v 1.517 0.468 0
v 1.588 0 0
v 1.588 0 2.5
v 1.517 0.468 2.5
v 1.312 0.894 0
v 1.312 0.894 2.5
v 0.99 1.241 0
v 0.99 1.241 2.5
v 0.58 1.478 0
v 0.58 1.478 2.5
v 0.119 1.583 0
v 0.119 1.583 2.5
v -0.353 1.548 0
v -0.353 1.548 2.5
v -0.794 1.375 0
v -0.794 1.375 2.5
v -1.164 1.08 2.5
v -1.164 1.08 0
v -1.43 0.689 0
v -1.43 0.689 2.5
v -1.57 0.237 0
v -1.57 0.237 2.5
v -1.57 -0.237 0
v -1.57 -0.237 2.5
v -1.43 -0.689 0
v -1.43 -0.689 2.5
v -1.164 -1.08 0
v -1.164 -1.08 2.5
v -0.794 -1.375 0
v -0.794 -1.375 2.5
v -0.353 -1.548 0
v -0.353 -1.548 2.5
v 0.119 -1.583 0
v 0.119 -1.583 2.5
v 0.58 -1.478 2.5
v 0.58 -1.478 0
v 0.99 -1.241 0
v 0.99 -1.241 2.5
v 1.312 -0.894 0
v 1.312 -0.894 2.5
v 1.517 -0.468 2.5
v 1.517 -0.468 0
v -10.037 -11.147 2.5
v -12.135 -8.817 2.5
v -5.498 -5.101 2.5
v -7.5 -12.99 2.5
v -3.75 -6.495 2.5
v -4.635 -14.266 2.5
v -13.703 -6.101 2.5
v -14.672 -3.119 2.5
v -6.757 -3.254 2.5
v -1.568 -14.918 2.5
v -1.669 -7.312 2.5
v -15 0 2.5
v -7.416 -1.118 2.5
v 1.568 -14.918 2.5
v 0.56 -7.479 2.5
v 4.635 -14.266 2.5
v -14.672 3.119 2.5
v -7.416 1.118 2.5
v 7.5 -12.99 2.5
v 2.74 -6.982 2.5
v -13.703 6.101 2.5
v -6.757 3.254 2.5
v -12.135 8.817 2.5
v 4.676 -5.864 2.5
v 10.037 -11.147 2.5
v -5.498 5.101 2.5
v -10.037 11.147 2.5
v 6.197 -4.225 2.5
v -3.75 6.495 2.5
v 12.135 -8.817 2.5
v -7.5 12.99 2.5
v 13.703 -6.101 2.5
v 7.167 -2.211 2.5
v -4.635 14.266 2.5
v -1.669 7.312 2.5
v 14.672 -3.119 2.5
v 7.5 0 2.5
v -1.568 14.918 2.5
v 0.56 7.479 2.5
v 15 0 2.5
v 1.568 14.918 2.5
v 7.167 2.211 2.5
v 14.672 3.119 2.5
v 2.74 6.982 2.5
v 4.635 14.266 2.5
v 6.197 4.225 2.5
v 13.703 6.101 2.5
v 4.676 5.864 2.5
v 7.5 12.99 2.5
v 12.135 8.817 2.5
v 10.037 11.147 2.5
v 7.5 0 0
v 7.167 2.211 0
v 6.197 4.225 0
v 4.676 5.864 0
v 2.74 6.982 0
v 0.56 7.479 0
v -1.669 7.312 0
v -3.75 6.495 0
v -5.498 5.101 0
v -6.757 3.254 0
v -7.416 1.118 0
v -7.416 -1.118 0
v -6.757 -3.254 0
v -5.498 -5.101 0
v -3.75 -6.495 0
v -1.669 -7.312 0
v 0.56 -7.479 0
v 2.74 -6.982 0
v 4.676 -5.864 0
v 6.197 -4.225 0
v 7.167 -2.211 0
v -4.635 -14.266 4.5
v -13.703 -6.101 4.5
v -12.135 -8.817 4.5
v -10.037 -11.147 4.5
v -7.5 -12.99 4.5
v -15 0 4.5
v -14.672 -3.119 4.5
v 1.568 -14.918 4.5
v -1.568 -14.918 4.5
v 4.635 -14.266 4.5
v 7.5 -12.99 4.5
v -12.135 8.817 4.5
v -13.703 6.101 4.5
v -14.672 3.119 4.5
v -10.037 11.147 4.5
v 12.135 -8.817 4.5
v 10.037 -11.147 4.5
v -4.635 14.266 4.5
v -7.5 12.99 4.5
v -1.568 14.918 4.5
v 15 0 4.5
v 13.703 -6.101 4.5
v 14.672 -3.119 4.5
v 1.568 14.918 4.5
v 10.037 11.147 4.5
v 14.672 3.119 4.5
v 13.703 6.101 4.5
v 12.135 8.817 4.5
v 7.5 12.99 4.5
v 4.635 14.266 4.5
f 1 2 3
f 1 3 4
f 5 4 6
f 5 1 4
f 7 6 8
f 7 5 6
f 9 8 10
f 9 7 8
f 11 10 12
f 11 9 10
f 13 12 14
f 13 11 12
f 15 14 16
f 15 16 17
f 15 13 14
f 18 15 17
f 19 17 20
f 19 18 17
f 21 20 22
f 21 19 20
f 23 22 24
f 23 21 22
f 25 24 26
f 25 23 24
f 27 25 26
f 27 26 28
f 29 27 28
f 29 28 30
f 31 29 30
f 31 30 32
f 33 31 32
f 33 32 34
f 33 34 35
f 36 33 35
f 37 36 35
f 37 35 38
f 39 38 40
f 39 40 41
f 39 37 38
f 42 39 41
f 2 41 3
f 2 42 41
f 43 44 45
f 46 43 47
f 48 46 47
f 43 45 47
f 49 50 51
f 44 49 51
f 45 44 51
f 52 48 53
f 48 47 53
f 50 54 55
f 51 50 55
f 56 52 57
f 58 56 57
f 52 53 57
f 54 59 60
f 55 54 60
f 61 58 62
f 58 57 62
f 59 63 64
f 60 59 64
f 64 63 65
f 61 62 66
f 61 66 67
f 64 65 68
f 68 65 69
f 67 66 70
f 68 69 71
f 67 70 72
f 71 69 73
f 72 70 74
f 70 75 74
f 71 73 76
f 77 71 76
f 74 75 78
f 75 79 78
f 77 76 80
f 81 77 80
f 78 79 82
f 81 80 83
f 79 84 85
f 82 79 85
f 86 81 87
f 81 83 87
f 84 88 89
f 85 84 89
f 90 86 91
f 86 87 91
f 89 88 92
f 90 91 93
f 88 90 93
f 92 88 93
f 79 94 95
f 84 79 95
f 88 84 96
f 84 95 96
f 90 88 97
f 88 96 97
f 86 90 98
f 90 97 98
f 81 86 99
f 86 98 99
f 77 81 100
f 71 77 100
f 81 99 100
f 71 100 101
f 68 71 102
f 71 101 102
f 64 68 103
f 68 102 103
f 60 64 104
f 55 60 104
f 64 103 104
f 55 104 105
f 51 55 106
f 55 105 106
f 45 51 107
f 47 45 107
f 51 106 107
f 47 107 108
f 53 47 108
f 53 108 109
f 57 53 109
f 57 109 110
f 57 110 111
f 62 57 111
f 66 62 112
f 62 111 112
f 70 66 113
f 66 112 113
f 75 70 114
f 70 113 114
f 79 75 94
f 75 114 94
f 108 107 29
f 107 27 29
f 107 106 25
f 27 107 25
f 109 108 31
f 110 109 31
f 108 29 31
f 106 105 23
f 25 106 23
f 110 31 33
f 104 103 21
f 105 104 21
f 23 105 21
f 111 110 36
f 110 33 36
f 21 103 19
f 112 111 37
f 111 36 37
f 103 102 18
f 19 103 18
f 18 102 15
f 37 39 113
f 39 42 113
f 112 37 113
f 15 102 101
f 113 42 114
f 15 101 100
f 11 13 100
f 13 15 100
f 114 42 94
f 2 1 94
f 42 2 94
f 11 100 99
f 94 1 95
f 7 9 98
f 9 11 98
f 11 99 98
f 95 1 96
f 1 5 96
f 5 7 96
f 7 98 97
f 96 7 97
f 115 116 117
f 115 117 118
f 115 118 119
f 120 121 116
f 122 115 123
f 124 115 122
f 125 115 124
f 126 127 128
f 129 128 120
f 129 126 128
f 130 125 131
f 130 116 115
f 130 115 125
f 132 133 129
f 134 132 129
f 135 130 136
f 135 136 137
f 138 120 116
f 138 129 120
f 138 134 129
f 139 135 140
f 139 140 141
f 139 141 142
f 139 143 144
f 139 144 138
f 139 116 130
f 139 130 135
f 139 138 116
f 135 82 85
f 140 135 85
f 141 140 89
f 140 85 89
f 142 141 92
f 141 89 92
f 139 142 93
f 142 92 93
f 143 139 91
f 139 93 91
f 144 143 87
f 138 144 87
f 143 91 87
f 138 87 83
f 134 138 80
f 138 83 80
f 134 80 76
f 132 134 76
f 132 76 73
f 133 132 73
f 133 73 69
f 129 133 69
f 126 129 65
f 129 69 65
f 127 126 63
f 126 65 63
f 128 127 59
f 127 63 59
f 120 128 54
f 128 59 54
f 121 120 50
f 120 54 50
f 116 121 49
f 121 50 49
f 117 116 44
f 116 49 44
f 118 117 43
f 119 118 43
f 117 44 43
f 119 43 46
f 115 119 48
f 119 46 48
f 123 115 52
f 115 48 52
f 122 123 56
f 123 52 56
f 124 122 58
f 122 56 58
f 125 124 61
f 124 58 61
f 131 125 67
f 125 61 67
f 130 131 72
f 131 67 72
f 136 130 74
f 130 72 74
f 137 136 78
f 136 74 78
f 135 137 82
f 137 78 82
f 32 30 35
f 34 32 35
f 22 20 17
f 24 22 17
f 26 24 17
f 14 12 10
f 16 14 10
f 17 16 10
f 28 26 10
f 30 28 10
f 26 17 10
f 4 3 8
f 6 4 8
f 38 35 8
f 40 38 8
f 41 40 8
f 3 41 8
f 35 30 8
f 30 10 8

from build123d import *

# Parameters (mm, degrees)
F0_R     = 7.5
F0_R_2   = 1.5875
F1_DEPTH = 2.5
F2_R     = 15
F2_R_2   = 7.5
F3_DEPTH = 2


with BuildPart() as f1:
    # F0 (on Top) → F1 (new body)
    with BuildSketch(Plane.XY):
        Circle(F0_R)
        Circle(F0_R_2, mode=Mode.SUBTRACT)
    extrude(amount=F1_DEPTH)

    # F2 (on face) → F3 (join)
    with BuildSketch(Plane.XY.offset(2.5)):
        Circle(F2_R)
        Circle(F2_R_2, mode=Mode.SUBTRACT)
        Circle(F2_R)
    extrude(amount=F3_DEPTH)


solid = f1.part
